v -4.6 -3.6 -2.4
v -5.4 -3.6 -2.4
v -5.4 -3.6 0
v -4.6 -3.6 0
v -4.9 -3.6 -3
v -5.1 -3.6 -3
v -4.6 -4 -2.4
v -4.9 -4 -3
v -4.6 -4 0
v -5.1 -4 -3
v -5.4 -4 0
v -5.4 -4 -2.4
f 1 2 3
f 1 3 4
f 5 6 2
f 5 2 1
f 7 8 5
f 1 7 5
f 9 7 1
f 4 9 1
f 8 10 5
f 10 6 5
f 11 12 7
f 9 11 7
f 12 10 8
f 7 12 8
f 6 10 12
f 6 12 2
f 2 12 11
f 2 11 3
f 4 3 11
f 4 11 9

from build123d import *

# Parameters (mm, degrees)
BOX032_W           = 0.8
BOX032_H           = 0.4
BOX032_DEPTH       = 3
CHAMFER020_1_SIZE2 = 0.3
CHAMFER020_1_SIZE  = 0.6
CHAMFER020_2_SIZE2 = 0.3
CHAMFER020_2_SIZE  = 0.6


with BuildPart() as part:
    # Box032 → Box032 (new body)
    with BuildSketch(Plane(origin=(-5.4, -4, -3), x_dir=(1, 0, 0), z_dir=(0, 0, 1))):
        with Locations((0.4, 0.2)):
            Rectangle(BOX032_W, BOX032_H)
    extrude(amount=BOX032_DEPTH)

    # Chamfer020 1
    chamfer020_1_edges = [part.edges().sort_by_distance(p)[0] for p in [
        (-4.6, -3.8, -3),
    ]]
    chamfer020_1_side = part.faces().sort_by_distance((-4.6, -3.8, -1.5))[0]
    chamfer(chamfer020_1_edges, length=CHAMFER020_1_SIZE, length2=CHAMFER020_1_SIZE2, reference=chamfer020_1_side)

    # Chamfer020 2
    chamfer020_2_edges = [part.edges().sort_by_distance(p)[0] for p in [
        (-5.4, -3.8, -3),
    ]]
    chamfer020_2_side = part.faces().sort_by_distance((-5.4, -3.8, -1.5))[0]
    chamfer(chamfer020_2_edges, length=CHAMFER020_2_SIZE, length2=CHAMFER020_2_SIZE2, reference=chamfer020_2_side)


solid = part.part
